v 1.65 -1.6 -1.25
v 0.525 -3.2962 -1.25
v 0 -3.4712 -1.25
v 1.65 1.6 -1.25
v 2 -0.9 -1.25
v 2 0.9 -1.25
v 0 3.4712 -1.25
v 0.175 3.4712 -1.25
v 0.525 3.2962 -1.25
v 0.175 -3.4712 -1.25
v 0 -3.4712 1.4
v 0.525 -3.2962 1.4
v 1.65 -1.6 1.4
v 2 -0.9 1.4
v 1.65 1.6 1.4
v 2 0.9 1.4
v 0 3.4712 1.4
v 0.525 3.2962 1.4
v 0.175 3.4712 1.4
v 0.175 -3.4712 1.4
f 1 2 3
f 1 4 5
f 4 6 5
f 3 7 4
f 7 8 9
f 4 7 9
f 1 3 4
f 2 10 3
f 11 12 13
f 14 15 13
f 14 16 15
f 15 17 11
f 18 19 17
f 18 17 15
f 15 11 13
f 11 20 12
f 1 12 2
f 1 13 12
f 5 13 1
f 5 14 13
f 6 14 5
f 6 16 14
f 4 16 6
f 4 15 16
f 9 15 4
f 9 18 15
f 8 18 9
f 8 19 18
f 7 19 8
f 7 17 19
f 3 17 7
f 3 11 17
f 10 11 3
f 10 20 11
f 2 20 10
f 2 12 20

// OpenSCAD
module ziptiepoint(width = 2.5, depth = 2, cutout_sample = false) {
    module cutout(width, depth) {
        chamfer = 0.35;
        io_height = (depth) / tan(42);
        middle_height = depth * 1.25;

        // cutout for ziptie
        translate([0, - (2 * io_height + middle_height) / 2, - width / 2])
            linear_extrude(height = width + 0.15) {
                polygon([
                        [0, 0],
                        [chamfer-chamfer/2, 0],
                        [chamfer+chamfer/2, chamfer/2],
                        [depth - chamfer, io_height - chamfer],
                        [depth, io_height + chamfer],
                        [depth, io_height + middle_height - chamfer],
                        [depth - chamfer, io_height + middle_height + chamfer],
                        [chamfer+chamfer/2, 2 * io_height + middle_height - chamfer/2],
                        [chamfer-chamfer/2, 2 * io_height + middle_height],
                        [0, 2 * io_height + middle_height],
                    ]);
            }
    }

    if (cutout_sample) {
        cutout(width, depth);
    } else {
        rotate([90, 0, 180])
            cutout(width, depth);
    }
}

function ziptiepoint_fullHeight(ziptie_depth = 2) = (depth / tan(42))*2+(depth * 1.25);

ziptiepoint(cutout_sample = true);
